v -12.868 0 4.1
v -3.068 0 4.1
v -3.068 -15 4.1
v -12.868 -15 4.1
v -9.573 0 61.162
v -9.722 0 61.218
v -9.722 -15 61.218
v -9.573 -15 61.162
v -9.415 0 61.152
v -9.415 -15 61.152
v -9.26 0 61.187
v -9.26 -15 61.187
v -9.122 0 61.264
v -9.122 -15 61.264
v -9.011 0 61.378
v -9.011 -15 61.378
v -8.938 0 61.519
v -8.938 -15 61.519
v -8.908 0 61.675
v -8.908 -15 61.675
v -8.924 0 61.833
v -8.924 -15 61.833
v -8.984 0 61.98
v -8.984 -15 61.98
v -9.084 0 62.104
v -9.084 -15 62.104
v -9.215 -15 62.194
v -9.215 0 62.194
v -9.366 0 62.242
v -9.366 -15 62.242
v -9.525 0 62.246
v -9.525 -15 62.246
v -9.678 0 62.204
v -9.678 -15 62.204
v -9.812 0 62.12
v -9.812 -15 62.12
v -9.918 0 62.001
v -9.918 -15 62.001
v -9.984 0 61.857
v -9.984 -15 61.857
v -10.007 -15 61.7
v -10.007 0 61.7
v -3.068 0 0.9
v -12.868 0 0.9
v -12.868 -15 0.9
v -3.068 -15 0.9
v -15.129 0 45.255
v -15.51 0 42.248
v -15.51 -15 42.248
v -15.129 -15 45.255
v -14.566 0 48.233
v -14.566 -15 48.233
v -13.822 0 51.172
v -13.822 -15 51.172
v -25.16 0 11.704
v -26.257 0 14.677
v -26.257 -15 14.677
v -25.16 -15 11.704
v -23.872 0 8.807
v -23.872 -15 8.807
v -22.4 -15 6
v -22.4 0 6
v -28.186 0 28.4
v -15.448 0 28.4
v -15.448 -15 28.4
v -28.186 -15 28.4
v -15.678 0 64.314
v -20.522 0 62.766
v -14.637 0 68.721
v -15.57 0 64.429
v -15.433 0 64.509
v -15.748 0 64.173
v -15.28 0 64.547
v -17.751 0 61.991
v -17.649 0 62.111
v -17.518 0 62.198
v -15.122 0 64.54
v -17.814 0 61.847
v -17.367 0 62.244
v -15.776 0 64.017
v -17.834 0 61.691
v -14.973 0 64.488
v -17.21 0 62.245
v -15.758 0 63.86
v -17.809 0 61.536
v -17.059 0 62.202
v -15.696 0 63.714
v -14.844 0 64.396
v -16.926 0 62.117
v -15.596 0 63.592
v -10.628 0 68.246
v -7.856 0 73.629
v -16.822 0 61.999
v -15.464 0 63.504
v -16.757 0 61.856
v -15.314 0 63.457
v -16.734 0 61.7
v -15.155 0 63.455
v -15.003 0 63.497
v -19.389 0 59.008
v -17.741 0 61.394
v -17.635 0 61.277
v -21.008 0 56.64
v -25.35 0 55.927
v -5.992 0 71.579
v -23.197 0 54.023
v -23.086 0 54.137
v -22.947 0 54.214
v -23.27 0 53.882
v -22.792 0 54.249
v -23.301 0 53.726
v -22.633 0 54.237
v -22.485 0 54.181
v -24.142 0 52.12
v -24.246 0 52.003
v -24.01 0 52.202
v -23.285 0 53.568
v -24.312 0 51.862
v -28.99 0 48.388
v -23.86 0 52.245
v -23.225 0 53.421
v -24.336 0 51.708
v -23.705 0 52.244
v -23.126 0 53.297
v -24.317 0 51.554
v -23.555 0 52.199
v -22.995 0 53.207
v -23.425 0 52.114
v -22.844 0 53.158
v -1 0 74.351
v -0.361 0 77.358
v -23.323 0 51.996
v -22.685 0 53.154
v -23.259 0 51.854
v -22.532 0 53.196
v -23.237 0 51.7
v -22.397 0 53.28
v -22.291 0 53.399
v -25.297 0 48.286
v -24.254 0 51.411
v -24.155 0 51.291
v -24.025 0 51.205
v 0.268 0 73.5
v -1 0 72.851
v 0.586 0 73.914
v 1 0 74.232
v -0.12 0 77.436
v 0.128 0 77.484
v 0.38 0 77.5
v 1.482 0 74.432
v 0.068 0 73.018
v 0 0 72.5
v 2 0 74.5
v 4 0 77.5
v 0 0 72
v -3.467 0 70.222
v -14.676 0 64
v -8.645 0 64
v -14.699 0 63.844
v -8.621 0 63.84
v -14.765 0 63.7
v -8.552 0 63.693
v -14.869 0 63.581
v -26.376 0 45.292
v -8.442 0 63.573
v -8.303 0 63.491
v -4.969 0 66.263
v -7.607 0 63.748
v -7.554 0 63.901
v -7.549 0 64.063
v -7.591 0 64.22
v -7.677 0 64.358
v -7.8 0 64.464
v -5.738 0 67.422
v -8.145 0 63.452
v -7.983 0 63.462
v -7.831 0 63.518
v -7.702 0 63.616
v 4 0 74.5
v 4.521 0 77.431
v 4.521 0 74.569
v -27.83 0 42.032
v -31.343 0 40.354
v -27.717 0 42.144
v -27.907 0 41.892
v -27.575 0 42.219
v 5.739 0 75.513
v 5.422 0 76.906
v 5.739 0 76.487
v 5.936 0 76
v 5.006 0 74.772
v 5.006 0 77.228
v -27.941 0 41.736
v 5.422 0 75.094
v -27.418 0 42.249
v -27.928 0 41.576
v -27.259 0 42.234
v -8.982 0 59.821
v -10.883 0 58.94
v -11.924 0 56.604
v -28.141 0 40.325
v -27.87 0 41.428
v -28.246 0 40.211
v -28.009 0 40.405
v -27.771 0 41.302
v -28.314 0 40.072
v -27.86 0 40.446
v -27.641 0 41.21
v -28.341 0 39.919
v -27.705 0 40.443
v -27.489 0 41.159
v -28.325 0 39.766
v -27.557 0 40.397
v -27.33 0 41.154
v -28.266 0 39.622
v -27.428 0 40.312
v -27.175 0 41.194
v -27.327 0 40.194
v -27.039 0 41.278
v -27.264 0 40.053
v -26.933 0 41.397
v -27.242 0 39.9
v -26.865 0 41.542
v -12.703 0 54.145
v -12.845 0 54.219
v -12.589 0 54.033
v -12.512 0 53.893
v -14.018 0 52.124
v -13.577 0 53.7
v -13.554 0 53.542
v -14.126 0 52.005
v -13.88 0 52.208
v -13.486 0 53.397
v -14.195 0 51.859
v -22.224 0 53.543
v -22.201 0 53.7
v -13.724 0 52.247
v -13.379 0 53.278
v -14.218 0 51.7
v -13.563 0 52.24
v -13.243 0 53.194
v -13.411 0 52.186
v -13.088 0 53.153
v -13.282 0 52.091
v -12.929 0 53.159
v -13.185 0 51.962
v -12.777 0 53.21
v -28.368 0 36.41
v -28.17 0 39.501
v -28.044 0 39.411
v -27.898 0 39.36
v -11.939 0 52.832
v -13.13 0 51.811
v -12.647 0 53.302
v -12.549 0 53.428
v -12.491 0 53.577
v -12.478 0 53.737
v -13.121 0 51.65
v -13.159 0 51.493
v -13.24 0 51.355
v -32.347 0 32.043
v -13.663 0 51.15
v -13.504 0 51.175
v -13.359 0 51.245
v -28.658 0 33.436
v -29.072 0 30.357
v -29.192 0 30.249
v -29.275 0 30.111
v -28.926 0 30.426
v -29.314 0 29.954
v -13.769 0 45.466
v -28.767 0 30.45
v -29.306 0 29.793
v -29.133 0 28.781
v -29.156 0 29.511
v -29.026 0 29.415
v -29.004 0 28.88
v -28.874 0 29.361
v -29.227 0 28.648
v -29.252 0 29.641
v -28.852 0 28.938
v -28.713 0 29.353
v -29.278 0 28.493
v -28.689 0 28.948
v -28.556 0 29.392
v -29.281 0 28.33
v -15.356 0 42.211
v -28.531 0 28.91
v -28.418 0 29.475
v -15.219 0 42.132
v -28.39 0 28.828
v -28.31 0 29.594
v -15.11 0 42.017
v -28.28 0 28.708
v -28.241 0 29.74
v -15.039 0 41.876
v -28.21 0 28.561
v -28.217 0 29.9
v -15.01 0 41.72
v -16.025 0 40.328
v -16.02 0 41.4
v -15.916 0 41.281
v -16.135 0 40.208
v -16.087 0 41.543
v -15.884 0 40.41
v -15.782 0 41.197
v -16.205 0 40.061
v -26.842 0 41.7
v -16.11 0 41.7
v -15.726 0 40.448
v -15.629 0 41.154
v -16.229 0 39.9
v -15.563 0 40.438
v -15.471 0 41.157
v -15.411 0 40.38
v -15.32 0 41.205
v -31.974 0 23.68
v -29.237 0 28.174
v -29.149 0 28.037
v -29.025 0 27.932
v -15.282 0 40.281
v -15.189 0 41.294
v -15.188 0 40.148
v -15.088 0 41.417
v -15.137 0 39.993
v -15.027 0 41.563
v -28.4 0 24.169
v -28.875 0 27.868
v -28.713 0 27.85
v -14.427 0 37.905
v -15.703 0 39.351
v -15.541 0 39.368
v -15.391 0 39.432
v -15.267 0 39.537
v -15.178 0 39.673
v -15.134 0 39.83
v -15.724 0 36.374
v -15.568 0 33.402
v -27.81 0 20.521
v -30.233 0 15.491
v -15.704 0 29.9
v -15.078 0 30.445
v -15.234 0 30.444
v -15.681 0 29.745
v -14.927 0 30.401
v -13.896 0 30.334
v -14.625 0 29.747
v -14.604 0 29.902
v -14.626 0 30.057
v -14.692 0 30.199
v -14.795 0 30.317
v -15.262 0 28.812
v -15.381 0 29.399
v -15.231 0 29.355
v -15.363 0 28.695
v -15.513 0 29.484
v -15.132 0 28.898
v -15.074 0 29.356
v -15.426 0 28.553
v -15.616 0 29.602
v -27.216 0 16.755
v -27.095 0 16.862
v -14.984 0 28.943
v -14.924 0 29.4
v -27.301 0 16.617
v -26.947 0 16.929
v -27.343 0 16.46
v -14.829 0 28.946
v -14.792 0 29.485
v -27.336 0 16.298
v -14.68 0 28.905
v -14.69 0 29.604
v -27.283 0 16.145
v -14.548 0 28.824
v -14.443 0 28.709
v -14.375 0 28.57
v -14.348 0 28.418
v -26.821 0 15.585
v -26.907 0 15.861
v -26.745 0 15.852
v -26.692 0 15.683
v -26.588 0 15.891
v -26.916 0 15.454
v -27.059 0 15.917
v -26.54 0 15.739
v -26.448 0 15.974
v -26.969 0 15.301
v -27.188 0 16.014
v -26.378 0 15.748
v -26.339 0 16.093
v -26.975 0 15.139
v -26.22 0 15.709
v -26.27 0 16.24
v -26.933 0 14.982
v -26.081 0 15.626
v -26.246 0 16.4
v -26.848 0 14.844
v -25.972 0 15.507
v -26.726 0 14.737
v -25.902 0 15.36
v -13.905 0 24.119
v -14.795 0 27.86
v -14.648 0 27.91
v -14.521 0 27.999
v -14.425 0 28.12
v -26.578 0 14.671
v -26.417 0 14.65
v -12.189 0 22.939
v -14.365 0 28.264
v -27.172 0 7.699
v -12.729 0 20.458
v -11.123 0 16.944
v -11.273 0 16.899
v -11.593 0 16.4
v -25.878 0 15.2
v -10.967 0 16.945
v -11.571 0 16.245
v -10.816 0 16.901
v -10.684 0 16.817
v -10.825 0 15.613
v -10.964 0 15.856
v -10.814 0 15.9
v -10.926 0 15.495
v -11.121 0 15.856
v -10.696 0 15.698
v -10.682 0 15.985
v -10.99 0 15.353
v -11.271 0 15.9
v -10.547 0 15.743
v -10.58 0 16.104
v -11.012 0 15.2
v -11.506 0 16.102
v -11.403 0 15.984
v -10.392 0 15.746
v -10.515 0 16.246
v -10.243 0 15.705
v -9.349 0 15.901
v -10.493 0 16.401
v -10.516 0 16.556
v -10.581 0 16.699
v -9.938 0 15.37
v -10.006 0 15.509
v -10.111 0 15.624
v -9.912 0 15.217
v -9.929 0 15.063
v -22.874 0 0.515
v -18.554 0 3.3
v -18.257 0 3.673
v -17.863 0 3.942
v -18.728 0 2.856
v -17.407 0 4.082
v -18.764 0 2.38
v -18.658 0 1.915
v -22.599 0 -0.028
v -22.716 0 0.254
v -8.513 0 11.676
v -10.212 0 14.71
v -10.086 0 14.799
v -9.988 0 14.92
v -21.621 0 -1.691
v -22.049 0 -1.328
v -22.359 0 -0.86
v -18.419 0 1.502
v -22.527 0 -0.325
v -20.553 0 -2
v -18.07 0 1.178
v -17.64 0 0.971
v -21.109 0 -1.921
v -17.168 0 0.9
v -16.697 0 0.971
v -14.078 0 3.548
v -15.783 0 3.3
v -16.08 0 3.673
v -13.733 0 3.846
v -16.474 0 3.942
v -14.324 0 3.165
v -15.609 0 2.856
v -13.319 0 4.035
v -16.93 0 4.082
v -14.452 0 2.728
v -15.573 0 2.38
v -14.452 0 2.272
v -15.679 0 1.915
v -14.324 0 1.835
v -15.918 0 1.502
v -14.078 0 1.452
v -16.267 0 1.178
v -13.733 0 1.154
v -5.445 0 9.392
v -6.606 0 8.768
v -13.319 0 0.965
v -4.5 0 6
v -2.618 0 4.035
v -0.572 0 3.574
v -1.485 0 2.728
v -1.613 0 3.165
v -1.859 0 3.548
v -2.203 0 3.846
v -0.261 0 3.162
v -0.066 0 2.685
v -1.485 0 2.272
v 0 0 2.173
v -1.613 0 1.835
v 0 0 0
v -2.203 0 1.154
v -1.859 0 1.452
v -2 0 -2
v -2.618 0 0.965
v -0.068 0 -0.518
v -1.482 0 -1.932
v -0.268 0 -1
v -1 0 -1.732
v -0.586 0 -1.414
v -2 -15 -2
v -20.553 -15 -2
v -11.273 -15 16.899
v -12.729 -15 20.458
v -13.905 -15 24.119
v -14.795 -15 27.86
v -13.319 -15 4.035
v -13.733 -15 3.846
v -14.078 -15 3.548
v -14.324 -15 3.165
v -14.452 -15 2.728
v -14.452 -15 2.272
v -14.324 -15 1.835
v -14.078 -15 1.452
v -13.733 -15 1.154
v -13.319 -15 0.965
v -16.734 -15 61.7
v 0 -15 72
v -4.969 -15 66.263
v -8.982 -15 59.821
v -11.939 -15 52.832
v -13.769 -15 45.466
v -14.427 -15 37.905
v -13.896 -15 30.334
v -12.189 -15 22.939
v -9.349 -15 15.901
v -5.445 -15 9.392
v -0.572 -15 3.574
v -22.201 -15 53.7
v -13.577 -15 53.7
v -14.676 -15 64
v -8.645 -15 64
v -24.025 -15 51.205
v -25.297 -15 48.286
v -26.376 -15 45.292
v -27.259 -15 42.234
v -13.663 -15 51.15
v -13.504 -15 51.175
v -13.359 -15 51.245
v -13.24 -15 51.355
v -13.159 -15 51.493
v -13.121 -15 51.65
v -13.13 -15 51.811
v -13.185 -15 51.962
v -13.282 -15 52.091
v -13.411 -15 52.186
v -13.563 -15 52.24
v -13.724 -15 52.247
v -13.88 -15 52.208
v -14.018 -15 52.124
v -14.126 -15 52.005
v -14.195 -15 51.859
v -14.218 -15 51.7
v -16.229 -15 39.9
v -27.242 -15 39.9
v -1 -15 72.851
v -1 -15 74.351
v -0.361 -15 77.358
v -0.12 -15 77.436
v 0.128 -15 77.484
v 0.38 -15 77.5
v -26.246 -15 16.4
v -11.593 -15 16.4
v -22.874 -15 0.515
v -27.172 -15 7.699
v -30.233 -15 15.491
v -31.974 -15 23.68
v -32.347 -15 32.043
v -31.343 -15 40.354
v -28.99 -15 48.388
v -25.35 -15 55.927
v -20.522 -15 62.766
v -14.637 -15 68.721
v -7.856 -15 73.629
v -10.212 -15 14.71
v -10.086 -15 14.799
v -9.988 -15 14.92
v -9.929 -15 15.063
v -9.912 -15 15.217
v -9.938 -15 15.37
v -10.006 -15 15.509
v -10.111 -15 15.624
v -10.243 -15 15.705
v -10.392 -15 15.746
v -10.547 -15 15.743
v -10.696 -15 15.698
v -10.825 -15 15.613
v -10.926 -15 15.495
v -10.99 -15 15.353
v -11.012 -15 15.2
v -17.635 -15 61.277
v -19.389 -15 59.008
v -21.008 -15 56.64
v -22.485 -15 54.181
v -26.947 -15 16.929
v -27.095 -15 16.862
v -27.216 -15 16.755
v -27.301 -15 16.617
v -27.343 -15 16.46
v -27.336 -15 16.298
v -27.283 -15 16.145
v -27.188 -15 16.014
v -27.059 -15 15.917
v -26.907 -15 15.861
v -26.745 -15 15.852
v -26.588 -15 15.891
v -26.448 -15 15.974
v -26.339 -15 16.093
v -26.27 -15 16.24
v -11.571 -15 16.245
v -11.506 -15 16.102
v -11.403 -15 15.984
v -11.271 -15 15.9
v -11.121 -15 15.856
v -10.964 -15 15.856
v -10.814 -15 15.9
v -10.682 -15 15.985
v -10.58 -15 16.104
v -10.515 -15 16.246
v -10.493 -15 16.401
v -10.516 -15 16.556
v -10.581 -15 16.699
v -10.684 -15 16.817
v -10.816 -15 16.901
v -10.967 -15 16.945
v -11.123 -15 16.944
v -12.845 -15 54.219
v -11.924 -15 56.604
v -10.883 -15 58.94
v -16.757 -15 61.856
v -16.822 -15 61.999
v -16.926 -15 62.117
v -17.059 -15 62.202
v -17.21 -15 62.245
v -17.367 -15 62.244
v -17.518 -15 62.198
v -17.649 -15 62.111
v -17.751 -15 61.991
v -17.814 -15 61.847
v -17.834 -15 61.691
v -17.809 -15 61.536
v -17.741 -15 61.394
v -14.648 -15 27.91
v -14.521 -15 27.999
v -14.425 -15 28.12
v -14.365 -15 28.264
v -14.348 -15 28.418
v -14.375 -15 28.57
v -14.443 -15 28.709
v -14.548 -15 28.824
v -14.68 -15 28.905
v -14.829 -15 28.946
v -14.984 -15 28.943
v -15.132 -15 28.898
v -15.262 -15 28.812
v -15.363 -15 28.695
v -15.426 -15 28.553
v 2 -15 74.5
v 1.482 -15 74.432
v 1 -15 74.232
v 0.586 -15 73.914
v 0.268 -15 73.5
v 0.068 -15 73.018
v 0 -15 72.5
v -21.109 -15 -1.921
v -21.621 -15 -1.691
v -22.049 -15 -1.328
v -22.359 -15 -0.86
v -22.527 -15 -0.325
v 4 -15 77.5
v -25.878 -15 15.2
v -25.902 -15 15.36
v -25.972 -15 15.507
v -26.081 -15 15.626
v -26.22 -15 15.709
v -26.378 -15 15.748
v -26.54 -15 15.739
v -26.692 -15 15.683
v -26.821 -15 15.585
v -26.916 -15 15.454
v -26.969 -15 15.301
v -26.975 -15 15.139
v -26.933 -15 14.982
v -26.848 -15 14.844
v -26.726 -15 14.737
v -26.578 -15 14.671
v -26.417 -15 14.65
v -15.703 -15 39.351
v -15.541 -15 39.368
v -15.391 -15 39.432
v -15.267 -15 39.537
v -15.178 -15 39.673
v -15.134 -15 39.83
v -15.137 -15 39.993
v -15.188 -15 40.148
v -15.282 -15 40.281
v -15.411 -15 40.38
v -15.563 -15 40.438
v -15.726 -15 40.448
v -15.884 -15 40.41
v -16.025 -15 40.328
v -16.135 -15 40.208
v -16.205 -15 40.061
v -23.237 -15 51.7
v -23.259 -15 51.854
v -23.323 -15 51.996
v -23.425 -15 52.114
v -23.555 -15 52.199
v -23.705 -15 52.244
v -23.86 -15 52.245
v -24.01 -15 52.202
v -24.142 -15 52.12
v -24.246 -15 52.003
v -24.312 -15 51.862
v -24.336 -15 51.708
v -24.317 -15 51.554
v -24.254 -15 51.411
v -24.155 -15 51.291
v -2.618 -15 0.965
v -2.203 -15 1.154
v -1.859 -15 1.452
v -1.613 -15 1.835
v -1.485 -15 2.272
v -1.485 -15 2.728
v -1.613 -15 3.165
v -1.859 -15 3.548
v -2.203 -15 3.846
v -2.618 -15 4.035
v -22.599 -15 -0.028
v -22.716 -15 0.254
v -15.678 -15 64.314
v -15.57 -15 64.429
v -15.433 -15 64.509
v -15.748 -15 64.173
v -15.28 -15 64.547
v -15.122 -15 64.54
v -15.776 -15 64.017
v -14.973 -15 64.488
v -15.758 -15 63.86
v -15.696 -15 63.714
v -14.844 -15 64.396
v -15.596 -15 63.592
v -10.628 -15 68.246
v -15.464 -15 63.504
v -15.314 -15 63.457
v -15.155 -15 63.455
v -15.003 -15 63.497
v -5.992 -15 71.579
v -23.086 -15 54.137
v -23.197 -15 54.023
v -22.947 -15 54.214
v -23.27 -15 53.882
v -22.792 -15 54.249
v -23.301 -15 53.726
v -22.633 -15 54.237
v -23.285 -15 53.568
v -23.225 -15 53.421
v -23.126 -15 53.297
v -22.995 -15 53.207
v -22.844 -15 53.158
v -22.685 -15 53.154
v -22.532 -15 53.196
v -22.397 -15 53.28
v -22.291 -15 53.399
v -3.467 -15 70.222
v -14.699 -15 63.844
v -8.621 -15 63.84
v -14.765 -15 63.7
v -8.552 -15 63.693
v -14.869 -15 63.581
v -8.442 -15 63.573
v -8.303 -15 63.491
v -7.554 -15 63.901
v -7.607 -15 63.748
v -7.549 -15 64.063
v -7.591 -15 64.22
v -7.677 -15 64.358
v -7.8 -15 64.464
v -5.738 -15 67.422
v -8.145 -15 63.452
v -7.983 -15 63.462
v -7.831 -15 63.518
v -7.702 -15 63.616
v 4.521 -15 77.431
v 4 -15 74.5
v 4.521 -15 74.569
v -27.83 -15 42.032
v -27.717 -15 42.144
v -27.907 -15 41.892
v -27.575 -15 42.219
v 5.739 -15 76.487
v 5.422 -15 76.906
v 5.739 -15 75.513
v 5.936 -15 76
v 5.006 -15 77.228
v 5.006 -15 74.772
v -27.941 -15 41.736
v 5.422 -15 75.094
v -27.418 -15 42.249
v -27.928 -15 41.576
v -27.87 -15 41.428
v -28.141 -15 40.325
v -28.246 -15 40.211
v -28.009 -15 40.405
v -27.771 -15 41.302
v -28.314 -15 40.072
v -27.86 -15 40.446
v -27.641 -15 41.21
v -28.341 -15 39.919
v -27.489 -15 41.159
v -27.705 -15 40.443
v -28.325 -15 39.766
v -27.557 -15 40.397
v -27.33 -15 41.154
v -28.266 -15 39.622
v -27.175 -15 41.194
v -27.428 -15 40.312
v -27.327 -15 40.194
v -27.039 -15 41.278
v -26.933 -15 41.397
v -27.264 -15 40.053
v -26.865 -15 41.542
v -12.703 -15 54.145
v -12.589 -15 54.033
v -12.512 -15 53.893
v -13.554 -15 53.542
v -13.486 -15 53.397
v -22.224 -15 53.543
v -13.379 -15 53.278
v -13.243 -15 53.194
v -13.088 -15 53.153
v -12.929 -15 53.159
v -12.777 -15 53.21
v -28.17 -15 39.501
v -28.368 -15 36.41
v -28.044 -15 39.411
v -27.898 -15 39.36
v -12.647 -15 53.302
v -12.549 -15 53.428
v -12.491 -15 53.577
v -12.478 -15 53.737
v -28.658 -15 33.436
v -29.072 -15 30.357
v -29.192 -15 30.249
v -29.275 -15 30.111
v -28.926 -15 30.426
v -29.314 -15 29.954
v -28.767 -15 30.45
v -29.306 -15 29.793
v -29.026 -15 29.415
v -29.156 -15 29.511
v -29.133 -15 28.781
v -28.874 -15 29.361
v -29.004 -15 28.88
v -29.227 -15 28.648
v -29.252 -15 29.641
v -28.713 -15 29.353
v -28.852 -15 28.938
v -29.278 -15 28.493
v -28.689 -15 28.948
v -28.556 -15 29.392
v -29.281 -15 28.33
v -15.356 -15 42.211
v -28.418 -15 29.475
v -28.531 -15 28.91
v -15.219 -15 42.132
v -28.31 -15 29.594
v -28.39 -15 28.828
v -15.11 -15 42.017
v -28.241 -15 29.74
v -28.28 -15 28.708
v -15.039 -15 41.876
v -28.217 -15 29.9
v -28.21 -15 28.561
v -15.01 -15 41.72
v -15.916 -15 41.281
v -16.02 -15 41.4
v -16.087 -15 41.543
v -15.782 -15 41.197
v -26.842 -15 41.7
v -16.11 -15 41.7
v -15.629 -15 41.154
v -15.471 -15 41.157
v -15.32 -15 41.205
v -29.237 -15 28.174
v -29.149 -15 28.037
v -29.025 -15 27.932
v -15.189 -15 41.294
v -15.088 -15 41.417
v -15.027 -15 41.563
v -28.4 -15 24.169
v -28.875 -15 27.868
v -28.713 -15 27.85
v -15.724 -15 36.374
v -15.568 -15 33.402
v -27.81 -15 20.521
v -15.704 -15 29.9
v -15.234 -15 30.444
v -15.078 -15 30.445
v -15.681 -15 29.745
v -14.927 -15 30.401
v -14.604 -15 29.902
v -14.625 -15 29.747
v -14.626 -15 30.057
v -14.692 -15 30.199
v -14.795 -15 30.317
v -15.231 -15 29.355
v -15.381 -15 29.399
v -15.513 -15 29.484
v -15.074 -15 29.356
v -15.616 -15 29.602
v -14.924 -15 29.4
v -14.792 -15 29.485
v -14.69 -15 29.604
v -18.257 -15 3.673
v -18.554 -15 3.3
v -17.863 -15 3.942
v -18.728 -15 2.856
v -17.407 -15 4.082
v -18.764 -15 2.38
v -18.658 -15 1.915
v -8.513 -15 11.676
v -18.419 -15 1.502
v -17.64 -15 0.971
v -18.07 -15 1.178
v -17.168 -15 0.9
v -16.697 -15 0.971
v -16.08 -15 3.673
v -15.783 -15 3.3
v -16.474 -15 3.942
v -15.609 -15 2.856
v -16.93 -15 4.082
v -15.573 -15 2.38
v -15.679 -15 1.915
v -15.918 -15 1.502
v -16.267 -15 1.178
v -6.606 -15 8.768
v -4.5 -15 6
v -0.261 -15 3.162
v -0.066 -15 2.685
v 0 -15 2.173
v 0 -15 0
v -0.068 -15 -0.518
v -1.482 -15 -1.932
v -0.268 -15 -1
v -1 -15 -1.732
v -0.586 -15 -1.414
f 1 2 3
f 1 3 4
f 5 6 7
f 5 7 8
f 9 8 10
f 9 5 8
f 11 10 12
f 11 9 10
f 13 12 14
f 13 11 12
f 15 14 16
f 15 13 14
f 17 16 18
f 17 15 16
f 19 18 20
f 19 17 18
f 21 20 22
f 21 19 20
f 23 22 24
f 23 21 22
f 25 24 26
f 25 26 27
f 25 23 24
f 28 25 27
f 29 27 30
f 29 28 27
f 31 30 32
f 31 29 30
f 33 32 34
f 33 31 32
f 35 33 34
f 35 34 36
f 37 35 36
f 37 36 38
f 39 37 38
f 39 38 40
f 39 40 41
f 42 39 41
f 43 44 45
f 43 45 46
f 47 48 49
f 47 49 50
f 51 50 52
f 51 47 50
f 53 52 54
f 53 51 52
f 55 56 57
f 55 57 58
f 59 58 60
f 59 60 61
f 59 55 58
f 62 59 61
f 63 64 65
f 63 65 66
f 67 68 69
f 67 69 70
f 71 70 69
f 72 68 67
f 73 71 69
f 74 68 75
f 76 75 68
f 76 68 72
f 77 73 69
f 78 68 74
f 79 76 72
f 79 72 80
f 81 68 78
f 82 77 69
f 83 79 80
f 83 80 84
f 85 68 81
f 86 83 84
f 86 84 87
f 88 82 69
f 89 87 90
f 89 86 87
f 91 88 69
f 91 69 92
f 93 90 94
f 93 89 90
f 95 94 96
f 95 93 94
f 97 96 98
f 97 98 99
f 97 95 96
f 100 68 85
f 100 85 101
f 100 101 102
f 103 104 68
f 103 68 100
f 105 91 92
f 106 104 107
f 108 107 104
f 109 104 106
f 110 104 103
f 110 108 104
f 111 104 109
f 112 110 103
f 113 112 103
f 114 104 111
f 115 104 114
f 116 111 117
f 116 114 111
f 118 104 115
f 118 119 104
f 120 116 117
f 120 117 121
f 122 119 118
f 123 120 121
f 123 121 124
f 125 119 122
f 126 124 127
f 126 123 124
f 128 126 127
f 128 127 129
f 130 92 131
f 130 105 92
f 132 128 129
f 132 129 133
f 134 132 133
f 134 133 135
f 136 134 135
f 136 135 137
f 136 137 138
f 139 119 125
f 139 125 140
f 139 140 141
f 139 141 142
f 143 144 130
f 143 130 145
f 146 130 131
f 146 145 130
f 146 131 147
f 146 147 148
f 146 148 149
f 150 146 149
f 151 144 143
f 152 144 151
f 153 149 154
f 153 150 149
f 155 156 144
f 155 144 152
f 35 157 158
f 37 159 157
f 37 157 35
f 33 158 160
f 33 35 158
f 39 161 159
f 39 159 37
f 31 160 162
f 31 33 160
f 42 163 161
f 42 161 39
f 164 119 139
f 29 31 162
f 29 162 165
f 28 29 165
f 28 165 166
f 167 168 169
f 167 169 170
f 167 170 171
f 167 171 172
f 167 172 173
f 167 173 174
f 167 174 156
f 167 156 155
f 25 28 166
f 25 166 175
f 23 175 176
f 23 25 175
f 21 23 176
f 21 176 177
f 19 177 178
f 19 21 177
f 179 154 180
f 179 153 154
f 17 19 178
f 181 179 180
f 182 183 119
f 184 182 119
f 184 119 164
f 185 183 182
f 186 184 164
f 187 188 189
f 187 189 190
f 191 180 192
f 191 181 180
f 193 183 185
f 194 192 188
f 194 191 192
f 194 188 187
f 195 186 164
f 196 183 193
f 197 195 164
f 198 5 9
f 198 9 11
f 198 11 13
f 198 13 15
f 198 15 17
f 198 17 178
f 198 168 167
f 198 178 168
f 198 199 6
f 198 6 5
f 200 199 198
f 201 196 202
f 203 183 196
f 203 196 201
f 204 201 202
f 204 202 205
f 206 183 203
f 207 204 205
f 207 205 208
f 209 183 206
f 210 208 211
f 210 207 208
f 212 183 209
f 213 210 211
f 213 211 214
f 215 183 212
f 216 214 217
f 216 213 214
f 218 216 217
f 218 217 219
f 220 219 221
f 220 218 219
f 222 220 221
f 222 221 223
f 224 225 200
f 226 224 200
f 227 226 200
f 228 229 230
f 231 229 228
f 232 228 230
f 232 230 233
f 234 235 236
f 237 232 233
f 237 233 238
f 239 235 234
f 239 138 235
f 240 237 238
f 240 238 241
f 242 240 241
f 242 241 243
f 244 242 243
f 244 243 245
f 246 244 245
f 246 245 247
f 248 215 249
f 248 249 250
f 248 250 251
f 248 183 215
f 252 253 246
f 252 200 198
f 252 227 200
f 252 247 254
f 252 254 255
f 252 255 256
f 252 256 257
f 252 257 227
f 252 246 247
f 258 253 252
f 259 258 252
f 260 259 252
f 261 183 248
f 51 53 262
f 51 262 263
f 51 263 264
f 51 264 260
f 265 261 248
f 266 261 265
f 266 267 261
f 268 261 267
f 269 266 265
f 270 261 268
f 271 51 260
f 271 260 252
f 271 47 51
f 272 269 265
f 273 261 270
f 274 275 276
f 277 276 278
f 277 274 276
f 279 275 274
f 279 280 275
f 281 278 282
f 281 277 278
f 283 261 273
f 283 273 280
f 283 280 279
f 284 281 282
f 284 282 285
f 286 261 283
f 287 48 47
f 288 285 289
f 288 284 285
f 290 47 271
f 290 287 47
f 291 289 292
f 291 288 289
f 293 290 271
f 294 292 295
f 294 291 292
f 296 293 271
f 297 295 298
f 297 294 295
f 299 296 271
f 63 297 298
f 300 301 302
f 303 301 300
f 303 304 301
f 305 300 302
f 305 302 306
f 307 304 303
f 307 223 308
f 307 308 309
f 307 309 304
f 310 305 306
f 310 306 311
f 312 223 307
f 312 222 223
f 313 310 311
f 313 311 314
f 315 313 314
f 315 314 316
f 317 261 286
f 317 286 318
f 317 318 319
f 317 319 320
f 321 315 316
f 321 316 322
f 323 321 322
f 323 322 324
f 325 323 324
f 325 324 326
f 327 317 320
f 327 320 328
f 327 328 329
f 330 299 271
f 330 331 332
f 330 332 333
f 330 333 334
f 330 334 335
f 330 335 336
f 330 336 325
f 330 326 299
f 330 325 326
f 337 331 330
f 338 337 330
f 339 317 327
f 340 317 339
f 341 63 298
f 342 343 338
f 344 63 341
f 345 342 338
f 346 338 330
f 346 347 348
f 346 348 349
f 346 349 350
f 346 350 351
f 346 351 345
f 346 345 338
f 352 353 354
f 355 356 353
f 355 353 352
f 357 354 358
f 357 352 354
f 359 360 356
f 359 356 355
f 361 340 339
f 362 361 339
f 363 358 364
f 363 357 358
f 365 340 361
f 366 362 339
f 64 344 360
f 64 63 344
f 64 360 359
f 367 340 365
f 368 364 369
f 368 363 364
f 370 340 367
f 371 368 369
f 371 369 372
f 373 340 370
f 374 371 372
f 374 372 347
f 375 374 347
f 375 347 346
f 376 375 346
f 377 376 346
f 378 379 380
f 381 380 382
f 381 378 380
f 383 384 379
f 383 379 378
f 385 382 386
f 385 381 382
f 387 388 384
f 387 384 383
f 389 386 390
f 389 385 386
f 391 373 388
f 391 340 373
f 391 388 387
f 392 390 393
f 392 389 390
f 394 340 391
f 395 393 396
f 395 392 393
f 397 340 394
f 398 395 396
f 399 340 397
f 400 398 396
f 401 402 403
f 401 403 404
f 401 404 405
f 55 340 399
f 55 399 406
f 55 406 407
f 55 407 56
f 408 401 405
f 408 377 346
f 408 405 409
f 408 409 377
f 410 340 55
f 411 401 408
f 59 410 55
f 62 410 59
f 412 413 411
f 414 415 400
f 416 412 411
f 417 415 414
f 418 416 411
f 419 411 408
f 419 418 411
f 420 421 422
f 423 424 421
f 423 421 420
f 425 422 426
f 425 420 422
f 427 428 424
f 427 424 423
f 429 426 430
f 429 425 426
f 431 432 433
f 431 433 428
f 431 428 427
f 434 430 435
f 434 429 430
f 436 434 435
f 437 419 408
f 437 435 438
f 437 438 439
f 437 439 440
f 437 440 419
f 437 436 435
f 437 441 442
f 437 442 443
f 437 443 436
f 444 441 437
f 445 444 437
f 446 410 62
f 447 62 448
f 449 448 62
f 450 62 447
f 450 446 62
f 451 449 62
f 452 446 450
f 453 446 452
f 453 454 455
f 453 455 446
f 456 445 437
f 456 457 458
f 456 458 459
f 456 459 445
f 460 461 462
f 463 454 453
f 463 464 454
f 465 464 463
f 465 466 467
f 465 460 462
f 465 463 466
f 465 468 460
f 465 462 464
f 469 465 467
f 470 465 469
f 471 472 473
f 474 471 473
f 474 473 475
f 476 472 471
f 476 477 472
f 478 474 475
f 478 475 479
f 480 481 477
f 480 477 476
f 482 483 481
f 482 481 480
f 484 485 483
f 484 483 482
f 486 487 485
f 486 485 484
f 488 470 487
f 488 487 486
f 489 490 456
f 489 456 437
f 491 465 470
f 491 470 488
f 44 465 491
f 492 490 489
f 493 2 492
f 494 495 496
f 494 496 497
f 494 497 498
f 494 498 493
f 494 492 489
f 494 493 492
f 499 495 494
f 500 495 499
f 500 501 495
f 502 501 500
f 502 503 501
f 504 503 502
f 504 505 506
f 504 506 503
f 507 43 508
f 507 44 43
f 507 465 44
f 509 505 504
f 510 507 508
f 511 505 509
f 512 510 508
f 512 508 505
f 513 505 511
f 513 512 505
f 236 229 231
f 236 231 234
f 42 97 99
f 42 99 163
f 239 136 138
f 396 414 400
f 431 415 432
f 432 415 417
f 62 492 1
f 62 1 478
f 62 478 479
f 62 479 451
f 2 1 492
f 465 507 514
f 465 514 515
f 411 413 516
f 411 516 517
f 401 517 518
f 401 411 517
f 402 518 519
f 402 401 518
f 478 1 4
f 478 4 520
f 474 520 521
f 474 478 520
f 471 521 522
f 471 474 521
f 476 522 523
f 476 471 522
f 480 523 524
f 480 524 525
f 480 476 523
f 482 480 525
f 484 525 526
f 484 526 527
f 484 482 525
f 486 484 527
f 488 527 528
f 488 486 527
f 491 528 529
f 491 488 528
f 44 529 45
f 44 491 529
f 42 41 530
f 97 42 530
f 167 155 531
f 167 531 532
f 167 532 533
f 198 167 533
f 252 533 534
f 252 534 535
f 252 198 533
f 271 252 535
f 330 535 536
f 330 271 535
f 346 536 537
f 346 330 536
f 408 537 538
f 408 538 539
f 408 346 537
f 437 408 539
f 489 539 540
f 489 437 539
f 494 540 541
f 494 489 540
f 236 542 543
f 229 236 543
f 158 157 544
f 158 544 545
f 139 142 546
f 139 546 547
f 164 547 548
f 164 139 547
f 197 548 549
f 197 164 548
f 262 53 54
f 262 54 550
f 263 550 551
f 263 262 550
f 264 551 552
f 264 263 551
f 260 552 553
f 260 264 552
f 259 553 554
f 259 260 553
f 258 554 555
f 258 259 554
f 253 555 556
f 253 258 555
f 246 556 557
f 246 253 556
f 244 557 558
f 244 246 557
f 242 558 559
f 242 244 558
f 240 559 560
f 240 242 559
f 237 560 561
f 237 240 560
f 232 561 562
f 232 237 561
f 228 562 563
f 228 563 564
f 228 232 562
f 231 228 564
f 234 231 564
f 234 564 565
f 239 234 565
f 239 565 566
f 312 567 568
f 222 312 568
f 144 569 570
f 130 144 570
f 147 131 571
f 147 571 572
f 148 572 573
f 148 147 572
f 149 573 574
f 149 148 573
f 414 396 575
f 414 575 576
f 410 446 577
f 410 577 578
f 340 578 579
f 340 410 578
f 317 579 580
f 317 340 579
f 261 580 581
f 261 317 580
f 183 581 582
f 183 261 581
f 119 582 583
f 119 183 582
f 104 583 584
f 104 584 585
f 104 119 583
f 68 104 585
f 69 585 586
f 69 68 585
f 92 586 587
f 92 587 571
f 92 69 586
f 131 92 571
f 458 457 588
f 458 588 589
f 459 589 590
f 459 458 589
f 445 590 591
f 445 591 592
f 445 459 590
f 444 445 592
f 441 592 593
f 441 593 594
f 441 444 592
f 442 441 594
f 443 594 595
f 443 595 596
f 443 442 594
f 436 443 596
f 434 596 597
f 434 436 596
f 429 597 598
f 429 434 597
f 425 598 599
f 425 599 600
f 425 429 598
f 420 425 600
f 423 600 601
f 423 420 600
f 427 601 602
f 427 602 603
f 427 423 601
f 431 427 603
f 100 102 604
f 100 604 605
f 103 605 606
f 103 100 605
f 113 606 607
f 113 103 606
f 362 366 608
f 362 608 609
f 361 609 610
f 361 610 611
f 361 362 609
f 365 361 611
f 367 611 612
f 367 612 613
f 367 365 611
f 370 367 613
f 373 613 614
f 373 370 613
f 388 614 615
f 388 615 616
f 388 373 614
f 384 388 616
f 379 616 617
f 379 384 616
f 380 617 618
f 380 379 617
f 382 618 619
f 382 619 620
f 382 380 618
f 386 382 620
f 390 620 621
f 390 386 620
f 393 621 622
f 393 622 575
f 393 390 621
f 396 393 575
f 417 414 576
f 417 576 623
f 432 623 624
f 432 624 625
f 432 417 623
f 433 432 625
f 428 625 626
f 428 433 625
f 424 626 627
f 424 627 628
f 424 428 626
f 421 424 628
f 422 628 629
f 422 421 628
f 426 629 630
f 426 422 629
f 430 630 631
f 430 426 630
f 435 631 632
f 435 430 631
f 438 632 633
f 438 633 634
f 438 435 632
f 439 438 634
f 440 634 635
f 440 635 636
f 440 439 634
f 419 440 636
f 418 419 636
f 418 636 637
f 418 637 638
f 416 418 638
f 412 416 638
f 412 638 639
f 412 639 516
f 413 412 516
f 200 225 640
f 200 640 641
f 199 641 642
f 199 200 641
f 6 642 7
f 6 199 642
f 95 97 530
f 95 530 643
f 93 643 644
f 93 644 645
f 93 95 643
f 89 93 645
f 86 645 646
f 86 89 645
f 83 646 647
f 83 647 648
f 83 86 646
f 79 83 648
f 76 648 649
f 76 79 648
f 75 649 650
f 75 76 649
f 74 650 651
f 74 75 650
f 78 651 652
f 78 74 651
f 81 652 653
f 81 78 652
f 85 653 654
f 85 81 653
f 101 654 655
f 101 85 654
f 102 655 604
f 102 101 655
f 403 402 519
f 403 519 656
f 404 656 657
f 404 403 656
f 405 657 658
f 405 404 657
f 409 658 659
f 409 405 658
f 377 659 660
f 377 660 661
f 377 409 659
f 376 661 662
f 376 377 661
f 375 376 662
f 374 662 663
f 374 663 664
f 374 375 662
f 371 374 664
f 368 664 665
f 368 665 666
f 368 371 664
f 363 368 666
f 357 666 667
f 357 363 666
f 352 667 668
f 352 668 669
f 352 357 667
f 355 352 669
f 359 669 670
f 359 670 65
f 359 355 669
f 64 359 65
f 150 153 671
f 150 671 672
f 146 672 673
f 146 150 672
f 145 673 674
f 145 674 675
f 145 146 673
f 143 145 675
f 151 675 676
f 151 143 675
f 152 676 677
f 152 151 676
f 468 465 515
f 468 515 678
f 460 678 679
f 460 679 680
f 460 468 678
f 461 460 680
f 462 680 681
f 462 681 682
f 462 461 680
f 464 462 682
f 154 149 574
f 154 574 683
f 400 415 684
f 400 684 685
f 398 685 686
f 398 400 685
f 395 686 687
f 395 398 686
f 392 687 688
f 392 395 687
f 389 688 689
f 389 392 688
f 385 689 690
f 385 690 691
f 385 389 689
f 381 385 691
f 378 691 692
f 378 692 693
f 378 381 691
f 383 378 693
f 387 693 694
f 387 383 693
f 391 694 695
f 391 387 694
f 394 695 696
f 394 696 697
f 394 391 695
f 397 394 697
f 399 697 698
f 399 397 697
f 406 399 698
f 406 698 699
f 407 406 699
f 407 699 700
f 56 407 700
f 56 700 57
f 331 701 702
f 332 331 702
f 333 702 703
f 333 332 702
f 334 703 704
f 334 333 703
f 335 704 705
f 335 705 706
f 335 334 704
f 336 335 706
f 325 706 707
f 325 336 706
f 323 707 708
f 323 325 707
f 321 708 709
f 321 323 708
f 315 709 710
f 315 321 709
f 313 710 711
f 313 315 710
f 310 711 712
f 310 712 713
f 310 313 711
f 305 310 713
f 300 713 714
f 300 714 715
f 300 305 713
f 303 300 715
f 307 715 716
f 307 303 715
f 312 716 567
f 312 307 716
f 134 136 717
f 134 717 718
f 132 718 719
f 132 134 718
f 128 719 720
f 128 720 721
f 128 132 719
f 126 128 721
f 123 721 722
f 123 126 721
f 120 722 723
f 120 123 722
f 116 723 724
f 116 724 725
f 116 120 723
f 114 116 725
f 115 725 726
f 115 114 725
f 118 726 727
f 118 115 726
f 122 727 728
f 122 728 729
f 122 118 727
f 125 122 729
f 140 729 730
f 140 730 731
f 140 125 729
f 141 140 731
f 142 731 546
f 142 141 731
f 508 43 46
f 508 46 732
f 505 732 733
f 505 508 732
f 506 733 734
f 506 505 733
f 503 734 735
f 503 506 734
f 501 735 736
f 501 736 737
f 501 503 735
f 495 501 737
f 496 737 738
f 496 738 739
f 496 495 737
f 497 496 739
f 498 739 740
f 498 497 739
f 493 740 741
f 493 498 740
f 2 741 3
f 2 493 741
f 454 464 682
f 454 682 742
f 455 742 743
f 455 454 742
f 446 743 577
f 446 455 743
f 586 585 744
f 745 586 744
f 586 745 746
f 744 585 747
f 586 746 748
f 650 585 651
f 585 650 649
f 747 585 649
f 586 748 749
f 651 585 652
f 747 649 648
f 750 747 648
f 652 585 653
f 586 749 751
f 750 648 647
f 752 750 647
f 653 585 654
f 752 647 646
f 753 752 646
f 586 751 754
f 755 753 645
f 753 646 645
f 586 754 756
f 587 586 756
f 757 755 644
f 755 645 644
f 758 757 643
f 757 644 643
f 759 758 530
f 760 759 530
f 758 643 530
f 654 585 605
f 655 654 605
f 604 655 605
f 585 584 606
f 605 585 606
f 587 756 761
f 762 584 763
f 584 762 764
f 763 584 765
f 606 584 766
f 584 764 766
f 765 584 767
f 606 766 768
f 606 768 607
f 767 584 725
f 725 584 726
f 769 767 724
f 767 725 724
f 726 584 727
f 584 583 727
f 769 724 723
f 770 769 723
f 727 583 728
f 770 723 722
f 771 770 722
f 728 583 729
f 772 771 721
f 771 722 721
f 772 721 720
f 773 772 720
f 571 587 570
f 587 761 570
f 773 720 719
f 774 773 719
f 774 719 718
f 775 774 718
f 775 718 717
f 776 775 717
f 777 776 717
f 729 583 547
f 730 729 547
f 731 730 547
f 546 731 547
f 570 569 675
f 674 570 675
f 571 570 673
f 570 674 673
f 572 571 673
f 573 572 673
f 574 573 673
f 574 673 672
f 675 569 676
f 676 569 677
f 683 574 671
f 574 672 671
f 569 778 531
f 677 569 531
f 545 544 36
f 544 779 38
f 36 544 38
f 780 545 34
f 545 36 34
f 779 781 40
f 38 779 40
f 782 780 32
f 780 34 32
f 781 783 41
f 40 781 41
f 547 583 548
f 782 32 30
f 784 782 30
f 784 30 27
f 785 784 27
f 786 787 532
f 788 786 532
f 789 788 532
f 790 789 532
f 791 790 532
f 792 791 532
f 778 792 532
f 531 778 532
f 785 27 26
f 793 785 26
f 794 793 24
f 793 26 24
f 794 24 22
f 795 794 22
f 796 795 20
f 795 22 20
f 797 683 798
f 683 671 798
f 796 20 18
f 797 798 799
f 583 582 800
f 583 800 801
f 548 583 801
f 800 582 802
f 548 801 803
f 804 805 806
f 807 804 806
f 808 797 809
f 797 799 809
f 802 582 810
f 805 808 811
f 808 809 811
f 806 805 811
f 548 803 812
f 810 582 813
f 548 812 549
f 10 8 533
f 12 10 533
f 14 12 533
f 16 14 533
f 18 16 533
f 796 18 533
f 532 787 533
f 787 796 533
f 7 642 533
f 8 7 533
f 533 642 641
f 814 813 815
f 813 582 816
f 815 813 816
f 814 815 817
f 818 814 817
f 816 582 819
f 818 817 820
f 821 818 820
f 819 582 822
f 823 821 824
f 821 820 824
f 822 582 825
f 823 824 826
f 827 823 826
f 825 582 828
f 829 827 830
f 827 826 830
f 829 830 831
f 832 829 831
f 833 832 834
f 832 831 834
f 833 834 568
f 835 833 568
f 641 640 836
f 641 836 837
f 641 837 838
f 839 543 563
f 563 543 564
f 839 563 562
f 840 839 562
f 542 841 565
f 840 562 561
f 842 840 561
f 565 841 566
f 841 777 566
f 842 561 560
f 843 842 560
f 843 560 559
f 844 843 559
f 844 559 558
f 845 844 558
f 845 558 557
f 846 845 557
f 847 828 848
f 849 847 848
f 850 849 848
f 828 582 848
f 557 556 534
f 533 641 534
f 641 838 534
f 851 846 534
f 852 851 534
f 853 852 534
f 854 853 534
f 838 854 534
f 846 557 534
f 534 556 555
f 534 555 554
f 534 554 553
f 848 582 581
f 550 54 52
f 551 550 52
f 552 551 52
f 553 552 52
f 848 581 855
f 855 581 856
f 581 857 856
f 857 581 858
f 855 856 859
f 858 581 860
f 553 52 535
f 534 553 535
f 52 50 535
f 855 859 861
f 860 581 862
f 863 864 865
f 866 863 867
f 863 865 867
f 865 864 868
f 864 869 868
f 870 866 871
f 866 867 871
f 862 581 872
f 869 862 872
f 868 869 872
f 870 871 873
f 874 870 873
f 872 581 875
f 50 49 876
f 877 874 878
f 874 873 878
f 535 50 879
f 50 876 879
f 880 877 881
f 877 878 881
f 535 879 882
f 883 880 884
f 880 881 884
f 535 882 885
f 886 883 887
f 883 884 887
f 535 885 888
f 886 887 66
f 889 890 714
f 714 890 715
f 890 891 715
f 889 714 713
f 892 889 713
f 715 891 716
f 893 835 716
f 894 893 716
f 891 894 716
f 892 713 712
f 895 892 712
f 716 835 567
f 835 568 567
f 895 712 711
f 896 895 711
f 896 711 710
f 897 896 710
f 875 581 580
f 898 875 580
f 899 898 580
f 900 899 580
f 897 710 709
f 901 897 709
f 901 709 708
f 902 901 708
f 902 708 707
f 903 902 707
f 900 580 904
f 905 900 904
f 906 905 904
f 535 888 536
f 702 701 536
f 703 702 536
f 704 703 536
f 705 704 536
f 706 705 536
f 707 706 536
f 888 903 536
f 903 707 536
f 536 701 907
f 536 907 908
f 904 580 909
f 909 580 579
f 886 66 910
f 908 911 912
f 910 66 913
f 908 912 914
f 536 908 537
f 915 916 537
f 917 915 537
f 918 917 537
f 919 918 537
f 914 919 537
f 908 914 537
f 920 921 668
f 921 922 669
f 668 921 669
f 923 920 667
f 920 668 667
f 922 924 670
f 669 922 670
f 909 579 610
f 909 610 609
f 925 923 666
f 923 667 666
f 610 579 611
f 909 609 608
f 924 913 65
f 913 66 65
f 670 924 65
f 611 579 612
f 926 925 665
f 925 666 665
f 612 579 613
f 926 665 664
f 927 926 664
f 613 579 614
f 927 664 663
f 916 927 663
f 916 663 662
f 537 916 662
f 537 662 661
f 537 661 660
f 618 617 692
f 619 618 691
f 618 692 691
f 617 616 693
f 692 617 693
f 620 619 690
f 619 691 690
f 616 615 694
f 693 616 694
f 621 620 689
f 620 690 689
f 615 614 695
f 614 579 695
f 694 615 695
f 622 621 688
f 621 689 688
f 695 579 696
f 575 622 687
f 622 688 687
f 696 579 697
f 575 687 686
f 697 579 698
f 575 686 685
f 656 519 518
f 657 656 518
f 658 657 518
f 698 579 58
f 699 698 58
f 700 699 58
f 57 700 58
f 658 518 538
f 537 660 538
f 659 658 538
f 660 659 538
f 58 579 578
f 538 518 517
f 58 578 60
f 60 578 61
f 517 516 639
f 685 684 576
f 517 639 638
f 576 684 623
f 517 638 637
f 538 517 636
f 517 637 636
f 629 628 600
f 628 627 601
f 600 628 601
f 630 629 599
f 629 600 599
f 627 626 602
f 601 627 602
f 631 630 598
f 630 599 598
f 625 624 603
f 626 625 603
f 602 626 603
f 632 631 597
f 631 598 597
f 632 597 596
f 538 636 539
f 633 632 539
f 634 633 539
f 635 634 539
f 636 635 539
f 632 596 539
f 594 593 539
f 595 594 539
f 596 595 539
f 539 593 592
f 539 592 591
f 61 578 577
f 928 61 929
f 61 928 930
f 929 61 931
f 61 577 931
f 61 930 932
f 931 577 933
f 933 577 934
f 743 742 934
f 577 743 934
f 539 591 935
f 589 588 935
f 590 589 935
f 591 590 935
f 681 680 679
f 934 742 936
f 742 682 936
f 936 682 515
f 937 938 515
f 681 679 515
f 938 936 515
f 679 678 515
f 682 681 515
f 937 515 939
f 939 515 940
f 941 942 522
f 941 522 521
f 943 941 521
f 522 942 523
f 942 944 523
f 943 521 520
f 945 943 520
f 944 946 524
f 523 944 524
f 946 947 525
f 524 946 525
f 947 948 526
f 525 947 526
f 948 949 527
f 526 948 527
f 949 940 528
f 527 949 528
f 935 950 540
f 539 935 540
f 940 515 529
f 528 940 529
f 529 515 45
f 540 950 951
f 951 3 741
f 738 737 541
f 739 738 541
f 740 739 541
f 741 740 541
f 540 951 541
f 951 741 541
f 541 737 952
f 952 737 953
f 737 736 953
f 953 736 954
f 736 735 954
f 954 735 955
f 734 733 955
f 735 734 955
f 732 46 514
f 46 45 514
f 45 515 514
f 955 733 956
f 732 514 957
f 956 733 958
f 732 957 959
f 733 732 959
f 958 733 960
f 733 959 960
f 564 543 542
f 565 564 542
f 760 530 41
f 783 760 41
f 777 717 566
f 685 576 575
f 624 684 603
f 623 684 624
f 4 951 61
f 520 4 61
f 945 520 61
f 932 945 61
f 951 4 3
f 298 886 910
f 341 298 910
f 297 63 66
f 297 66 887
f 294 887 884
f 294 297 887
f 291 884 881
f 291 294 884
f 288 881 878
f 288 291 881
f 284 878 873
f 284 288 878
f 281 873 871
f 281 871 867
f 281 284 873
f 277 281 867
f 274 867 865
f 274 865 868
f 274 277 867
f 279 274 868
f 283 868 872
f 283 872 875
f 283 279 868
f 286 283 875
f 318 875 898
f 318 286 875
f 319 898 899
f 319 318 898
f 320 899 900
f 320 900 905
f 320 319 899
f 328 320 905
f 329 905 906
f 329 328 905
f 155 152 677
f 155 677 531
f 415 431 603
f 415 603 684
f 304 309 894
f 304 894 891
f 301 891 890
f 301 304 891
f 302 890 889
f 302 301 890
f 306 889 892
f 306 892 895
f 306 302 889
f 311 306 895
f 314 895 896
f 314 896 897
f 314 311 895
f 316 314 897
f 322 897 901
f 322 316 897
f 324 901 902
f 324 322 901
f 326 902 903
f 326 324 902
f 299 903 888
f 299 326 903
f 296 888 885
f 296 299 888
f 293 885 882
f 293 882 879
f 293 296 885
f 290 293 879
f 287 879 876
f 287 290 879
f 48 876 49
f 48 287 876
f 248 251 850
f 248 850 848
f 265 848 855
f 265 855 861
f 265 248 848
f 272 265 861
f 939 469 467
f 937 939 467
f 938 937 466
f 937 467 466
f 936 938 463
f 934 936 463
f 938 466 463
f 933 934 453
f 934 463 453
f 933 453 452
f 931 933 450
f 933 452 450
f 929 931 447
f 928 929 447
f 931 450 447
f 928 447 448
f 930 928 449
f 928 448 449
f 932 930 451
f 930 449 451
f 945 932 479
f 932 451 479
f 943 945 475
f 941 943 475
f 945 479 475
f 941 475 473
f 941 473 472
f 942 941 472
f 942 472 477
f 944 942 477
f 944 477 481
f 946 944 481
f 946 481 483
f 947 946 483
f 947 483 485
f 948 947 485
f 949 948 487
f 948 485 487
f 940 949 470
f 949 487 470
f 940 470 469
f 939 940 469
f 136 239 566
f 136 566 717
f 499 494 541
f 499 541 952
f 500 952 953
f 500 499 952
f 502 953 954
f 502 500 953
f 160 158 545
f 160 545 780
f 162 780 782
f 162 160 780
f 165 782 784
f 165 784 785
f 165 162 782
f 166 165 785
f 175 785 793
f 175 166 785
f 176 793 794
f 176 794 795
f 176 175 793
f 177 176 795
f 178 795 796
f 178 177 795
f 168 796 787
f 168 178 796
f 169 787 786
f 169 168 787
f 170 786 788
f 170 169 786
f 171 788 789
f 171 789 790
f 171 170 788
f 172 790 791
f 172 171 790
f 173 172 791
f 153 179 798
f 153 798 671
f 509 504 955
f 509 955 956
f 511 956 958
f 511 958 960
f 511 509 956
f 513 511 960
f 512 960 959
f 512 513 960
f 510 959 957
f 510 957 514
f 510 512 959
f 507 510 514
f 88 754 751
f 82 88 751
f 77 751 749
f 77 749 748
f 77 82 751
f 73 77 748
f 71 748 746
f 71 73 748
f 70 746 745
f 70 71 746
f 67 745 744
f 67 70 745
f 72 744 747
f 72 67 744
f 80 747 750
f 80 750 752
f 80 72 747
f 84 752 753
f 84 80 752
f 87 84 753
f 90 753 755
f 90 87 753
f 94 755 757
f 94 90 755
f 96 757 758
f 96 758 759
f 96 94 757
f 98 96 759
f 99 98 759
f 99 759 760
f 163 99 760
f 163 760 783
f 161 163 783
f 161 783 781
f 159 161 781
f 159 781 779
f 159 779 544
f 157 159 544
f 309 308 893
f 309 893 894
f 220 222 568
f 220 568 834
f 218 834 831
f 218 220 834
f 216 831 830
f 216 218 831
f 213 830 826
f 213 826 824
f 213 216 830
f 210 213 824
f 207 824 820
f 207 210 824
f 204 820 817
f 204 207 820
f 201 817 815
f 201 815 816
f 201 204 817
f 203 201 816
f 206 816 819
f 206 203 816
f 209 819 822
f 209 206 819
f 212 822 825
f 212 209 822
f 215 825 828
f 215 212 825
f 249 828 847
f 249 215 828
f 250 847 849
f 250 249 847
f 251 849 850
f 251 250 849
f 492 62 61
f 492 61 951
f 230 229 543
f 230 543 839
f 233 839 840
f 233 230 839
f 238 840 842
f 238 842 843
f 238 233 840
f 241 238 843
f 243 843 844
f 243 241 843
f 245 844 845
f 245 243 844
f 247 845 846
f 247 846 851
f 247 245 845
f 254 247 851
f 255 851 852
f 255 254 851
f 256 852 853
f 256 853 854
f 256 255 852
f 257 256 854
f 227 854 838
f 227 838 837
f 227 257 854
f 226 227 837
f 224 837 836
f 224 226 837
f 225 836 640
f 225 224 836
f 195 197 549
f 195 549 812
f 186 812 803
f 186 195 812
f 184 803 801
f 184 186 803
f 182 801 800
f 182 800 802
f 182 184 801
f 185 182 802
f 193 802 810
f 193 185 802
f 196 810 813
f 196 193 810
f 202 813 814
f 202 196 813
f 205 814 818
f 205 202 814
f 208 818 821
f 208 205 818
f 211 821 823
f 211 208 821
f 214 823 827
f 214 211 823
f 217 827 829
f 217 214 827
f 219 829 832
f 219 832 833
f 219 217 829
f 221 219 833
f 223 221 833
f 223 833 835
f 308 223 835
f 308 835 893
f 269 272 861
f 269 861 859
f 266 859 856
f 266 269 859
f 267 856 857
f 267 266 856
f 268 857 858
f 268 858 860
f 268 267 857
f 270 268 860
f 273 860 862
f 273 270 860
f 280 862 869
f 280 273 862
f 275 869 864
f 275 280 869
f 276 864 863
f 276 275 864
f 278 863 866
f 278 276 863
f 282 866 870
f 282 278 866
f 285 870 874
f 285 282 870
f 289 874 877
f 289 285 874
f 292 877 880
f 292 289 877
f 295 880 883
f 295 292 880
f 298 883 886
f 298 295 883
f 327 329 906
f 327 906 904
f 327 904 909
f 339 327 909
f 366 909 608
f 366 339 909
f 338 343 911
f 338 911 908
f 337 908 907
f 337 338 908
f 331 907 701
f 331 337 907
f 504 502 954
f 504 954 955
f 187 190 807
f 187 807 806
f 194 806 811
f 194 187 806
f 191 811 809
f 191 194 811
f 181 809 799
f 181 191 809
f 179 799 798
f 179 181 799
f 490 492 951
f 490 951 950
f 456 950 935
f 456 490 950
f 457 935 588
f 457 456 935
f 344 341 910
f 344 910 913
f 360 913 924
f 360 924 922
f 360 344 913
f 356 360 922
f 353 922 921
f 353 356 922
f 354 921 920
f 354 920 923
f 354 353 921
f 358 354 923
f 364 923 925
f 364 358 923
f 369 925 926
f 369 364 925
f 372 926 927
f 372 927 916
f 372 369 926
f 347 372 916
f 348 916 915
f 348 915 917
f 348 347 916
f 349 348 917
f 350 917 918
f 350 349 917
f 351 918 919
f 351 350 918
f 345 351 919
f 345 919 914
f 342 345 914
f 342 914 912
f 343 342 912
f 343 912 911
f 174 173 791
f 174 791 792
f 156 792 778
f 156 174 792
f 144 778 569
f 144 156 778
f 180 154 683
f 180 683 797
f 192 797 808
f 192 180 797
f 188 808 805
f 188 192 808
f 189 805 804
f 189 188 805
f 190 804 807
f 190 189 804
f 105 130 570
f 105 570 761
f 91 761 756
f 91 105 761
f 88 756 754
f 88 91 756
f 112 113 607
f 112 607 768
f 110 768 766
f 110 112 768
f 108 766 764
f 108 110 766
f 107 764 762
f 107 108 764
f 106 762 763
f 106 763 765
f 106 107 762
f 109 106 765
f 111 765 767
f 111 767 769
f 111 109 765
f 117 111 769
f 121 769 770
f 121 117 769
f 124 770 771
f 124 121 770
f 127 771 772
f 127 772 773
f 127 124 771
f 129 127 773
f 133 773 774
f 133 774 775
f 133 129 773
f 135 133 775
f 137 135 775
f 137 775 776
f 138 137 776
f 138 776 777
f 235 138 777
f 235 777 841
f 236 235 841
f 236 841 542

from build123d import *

# Parameters (mm, degrees)
ESQUISSE1_R        = 1.6
BOSS_EXTRU_1_DEPTH = 15


with BuildPart() as part:
    # Esquisse1 → Boss.-Extru.1 (new body)
    with BuildSketch(Plane(origin=(0, 0, 0), x_dir=(1, 0, 0), z_dir=(0, 1, 0))):
        with BuildLine():
            Line((0.379867182, -77.5), (4, -77.5))
            ThreePointArc((4, -77.5), (5.224744871, -77.08113883), (5.936491673, -76))
            ThreePointArc((5.936491673, -76), (5.224744871, -74.91886117), (4, -74.5))
            Line((4, -74.5), (2, -74.5))
            ThreePointArc((2, -74.5), (0.585786438, -73.914213562), (0, -72.5))
            Line((0, -72.5), (0, -72))
            ThreePointArc((0, -72), (-14.427005158, -37.9049997), (-0.571883425, -3.573627385))
            ThreePointArc((-0.571883425, -3.573627385), (-0.148482629, -2.929684622), (0, -2.173454879))
            Line((0, -2.173454879), (0, 0))
            ThreePointArc((0, 0), (-0.585786438, 1.414213562), (-2, 2))
            Line((-2, 2), (-20.553034366, 2))
            ThreePointArc((-20.553034366, 2), (-21.847406556, 1.524664105), (-22.526517183, 0.324600632))
            ThreePointArc((-22.526517183, 0.324600632), (-22.651920818, -0.115392313), (-22.874034374, -0.515374102))
            ThreePointArc((-22.874034374, -0.515374102), (-30.332217892, -44.419762154), (-0.360571251, -77.357888836))
            ThreePointArc((-0.360571251, -77.357888836), (0.002890838, -77.46415092), (0.379867182, -77.5))
        make_face()
        with Locations(Location((-17.168486885, -2.5, 0), (0, 0, 90))):
            Circle(ESQUISSE1_R, mode=Mode.SUBTRACT)
        with BuildLine():
            Line((-26.245903328, -16.4), (-11.593054617, -16.4))
            ThreePointArc((-11.593054617, -16.4), (-10.579787815, -16.103547862), (-11.273476907, -16.899405215))
            ThreePointArc((-11.273476907, -16.899405215), (-13.352037133, -22.277466593), (-14.794641856, -27.85983602))
            ThreePointArc((-14.794641856, -27.85983602), (-14.547802836, -28.823941756), (-15.448193173, -28.4))
            Line((-15.448193173, -28.4), (-28.185804557, -28.4))
            ThreePointArc((-28.185804557, -28.4), (-29.132721919, -28.780731674), (-28.712919494, -27.850476321))
            ThreePointArc((-28.712919494, -27.850476321), (-28.139109588, -22.339660076), (-26.947329323, -16.928743953))
            ThreePointArc((-26.947329323, -16.928743953), (-27.126974093, -15.960805113), (-26.245903328, -16.4))
        make_face(mode=Mode.SUBTRACT)
        with BuildLine():
            Line((-28.216882659, -29.9), (-15.703506193, -29.9))
            ThreePointArc((-15.703506193, -29.9), (-14.736948258, -29.540862859), (-15.234489879, -30.444005186))
            ThreePointArc((-15.234489879, -30.444005186), (-15.668556704, -34.886741932), (-15.702797946, -39.350501707))
            ThreePointArc((-15.702797946, -39.350501707), (-15.282185488, -40.280514324), (-16.229311222, -39.9))
            Line((-16.229311222, -39.9), (-27.241766652, -39.9))
            ThreePointArc((-27.241766652, -39.9), (-28.141135688, -40.3247838), (-27.897916749, -39.360340703))
            ThreePointArc((-27.897916749, -39.360340703), (-28.536105971, -34.925039157), (-28.766778335, -30.44999999))
            ThreePointArc((-28.766778335, -30.44999999), (-29.155828271, -29.511128156), (-28.216882659, -29.9))
        make_face(mode=Mode.SUBTRACT)
        with BuildLine():
            Line((-14.218448274, -51.7), (-23.236538966, -51.7))
            ThreePointArc((-23.236538966, -51.7), (-24.079106647, -52.165729699), (-24.025281338, -51.204518335))
            ThreePointArc((-24.025281338, -51.204518335), (-25.860949004, -46.797976835), (-27.259486048, -42.233836401))
            ThreePointArc((-27.259486048, -42.233836401), (-27.825028416, -41.361102537), (-26.841844264, -41.7))
            Line((-26.841844264, -41.7), (-16.109676342, -41.7))
            ThreePointArc((-16.109676342, -41.7), (-15.188659613, -41.293986962), (-15.510234208, -42.247773197))
            ThreePointArc((-15.510234208, -42.247773197), (-14.870347536, -46.748469382), (-13.822458806, -51.172003072))
            ThreePointArc((-13.822458806, -51.172003072), (-13.228444983, -52.029995612), (-14.218448274, -51.7))
        make_face(mode=Mode.SUBTRACT)
        with BuildLine():
            Line((-22.201450768, -53.7), (-13.576816642, -53.7))
            ThreePointArc((-13.576816642, -53.7), (-12.708653375, -53.251366369), (-12.844917969, -54.219049971))
            ThreePointArc((-12.844917969, -54.219049971), (-11.418475339, -57.778687264), (-9.722191927, -61.217928288))
            ThreePointArc((-9.722191927, -61.217928288), (-8.984061268, -61.980064854), (-10.007414918, -61.7))
            Line((-10.007414918, -61.7), (-16.734180973, -61.7))
            ThreePointArc((-16.734180973, -61.7), (-17.517935865, -62.197854045), (-17.635485157, -61.276815206))
            ThreePointArc((-17.635485157, -61.276815206), (-20.215891111, -57.835366348), (-22.484800972, -54.181038342))
            ThreePointArc((-22.484800972, -54.181038342), (-23.225348113, -53.420856119), (-22.201450768, -53.7))
        make_face(mode=Mode.SUBTRACT)
        with BuildLine():
            Line((-14.676144728, -64), (-8.645402719, -64))
            ThreePointArc((-8.645402719, -64), (-7.830810759, -63.517826697), (-7.799980557, -64.463924289))
            ThreePointArc((-7.799980557, -64.463924289), (-4.628127789, -68.842617177), (-1, -72.851393816))
            Line((-1, -72.851393816), (-1, -74.351393816))
            ThreePointArc((-1, -74.351393816), (-8.358263561, -69.980068178), (-14.84445078, -64.395992083))
            ThreePointArc((-14.84445078, -64.395992083), (-15.7323224, -63.784862453), (-14.676144728, -64))
        make_face(mode=Mode.SUBTRACT)
        with BuildLine():
            Line((-3.068400716, -4.1), (-12.868400716, -4.1))
            ThreePointArc((-12.868400716, -4.1), (-14.468400716, -2.5), (-12.868400716, -0.9))
            Line((-12.868400716, -0.9), (-3.068400716, -0.9))
            ThreePointArc((-3.068400716, -0.9), (-1.468400716, -2.5), (-3.068400716, -4.1))
        make_face(mode=Mode.SUBTRACT)
        with BuildLine():
            Line((-11.011595694, -15.2), (-25.878211235, -15.2))
            ThreePointArc((-25.878211235, -15.2), (-26.873424632, -15.52293193), (-26.257429531, -14.677186831))
            ThreePointArc((-26.257429531, -14.677186831), (-24.539239864, -10.245004819), (-22.4, -6))
            Line((-22.4, -6), (-4.5, -6))
            ThreePointArc((-4.5, -6), (-7.584699304, -10.204982732), (-10.212442966, -14.709670602))
            ThreePointArc((-10.212442966, -14.709670602), (-10.173962247, -15.668793132), (-11.011595694, -15.2))
        make_face(mode=Mode.SUBTRACT)
    extrude(amount=-BOSS_EXTRU_1_DEPTH)


solid = part.part
